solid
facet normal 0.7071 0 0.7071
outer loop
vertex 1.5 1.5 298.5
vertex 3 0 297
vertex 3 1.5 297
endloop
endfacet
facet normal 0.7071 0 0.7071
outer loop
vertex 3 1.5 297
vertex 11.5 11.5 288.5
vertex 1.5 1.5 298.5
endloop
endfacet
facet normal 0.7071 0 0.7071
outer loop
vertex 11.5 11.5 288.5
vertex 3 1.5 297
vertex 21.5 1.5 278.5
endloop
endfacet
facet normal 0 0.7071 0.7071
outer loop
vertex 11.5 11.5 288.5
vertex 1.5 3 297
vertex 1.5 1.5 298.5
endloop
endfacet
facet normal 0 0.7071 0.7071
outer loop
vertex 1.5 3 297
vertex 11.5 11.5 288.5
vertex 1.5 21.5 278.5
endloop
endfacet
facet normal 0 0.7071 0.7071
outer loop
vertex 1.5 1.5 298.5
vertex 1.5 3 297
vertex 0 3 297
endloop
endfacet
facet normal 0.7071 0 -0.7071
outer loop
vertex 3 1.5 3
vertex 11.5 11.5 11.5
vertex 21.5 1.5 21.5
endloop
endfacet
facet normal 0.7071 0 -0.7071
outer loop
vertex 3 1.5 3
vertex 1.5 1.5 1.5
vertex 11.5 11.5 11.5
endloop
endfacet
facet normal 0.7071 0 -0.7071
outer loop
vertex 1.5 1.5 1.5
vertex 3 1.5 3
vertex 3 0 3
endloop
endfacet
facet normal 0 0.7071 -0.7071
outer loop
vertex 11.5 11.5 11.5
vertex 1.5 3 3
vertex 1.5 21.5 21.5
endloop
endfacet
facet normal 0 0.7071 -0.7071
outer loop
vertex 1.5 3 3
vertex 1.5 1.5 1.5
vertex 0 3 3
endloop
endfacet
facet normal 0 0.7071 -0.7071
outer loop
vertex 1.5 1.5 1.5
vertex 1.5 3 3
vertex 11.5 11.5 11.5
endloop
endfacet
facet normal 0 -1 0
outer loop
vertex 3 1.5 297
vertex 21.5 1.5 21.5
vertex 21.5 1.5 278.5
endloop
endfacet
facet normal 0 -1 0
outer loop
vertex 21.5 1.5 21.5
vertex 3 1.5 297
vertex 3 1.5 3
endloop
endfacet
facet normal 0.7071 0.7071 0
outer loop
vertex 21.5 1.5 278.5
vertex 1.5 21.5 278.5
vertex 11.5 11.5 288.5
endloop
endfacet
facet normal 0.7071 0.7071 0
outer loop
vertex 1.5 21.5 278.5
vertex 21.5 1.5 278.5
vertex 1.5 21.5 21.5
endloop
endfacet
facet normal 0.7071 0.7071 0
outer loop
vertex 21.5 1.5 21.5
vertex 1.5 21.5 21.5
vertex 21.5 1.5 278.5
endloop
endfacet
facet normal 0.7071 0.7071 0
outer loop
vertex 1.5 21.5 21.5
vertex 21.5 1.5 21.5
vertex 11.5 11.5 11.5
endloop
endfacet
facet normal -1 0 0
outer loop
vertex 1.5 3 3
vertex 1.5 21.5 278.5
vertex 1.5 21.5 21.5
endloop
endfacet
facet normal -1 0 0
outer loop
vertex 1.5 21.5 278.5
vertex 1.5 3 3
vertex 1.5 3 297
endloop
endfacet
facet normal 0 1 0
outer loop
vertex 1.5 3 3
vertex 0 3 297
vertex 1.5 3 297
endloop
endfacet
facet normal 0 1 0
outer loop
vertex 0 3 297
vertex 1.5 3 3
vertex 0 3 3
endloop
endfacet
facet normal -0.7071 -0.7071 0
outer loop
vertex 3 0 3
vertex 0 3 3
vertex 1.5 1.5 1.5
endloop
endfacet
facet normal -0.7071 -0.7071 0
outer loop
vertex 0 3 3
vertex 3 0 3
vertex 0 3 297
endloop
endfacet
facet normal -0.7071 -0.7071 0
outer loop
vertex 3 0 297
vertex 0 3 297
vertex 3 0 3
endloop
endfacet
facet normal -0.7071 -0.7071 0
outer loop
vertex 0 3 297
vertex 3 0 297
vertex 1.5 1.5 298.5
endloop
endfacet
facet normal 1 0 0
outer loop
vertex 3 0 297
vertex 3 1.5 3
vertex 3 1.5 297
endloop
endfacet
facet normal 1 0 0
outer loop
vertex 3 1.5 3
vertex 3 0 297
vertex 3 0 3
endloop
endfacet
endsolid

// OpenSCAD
// file: ../libs/function_helpers.scad
////////////////////////////////////////////////////////////////////////////////////////////////////
// copyright by Bastian Baumeister | openscad@bastianbaumeister.de 
// function helpers, not rendering any objects
////////////////////////////////////////////////////////////////////////////////////////////////////
// 
// assert_greater(a ,b, errormessage)
// assert_greater_or_equal(a ,b, errormessage)
// assert_lesser(a ,b, errormessage)
// assert_lesser_or_equal(a ,b, errormessage)
//   asserts, that a is in relation to b what the function name says
//   errormessage should explain what a and b are (semantics), numeric values of a and b are output by the functions
//
// assert_is_element_of: to check wether value is part of a list
//   asserts if the given string-element is part of a list, list must be formes as a nested array: [["listitem1",1],["listitem2",2],...]
// 
// assert(bool,msg) 
//   if assertion criteria "err" evaluates to true, the assertion fails and outputs msg
//
////////////////////////////////////////////////////////////////////////////////////////////////////

module assert_greater(a,b,msg) {
  //asserts if a is bigger than b
  if (a<=b) {
    echo("<font color='red'><b>assertion failed</b></font>");
    echo("a>b failed for a=", a, " b=", b, msg);
    echo("", assertion_failed());
  }
}

module assert_greater_or_equal(a,b,msg) {
  //asserts if a is bigger than b
  if (a<b) {
    echo("<font color='red'><b>assertion failed</b></font>");
    echo("a>=b failed for a=", a, " b=", b, msg);
    echo("", assertion_failed());
  }
}

module assert_lesser(a,b,msg) {
  //asserts if a is bigger than b
  if (a>=b) {
    echo("<font color='red'><b>assertion failed</b></font>");
    echo("a<b failed for a=", a, " b=", b, msg);
    echo("", assertion_failed());
  }
}

module assert_lesser_or_equal(a,b,msg) {
  //asserts if a is bigger than b
  if (a>b) {
    echo("<font color='red'><b>assertion failed</b></font>");
    echo("a<=b failed for a=", a, " b=", b, msg);
    echo("", assertion_failed());
  }
}

module assert_is_element_of(elem,list,msg) {
  found=search([elem],list);
  if(!(found[0]>=0)) {
    echo("<font color='red'><b>assertion failed</b></font>");
    echo("element must be part of list failed for elem=",elem," list=",list, msg);
    echo("", assertion_failed());
  }    
}

module assert(bool,msg) {
  if (bool) {
    echo("<font color='red'><b>assertion failed</b></font>");
    echo(msg);
    echo("", assertion_failed());
  }
}

function assertion_failed() = (assertion_failed());
// main file
use <../libs/function_helpers.scad>;
include <../libs/object_helpers.scad>;


module strut(length=200, wst_cardboard=1.5, ends=2) {
  str_triangle = 20;
  edge_width = wst_cardboard;


  difference(){
    translate([wst_cardboard,wst_cardboard,0])
      linear_extrude(length) {
        rotate([0,0,180])
          translate([-edge_width,-edge_width,0]) {
            polygon([[0,0],[wst_cardboard+edge_width,0],[0,wst_cardboard+edge_width]]); //flat edges
            //square(wst_cardboard+edge_width, false); //sharp edges
          }
        polygon([[0,0], [0,str_triangle], [str_triangle,0]]);
      }
      
    if ( ends>0 ) {
      rotate([0,-45,0])
        translate([+str_triangle,0,-str_triangle])
          cube(2*str_triangle, true);
      rotate([45,0,0])
        translate([0,+str_triangle,-str_triangle])
          cube(2*str_triangle, true);
      if ( ends > 1 ) {
        translate([0,0,length]) {
          rotate([0,-45,0])
            translate([+str_triangle,0,-str_triangle])
              cube(2*str_triangle, true);
          rotate([45,0,0])
            translate([0,+str_triangle,-str_triangle])
              cube(2*str_triangle, true);
        }
      }
    }
  } 
}

strut(300,1.5,2);
//translate([0,1,0])
  //rotate([0,0,-90]) rotate([0,-90,0]) strut();
//translate([1,0,0])
  //rotate([0,90,0]) rotate([0,0,90]) strut();
